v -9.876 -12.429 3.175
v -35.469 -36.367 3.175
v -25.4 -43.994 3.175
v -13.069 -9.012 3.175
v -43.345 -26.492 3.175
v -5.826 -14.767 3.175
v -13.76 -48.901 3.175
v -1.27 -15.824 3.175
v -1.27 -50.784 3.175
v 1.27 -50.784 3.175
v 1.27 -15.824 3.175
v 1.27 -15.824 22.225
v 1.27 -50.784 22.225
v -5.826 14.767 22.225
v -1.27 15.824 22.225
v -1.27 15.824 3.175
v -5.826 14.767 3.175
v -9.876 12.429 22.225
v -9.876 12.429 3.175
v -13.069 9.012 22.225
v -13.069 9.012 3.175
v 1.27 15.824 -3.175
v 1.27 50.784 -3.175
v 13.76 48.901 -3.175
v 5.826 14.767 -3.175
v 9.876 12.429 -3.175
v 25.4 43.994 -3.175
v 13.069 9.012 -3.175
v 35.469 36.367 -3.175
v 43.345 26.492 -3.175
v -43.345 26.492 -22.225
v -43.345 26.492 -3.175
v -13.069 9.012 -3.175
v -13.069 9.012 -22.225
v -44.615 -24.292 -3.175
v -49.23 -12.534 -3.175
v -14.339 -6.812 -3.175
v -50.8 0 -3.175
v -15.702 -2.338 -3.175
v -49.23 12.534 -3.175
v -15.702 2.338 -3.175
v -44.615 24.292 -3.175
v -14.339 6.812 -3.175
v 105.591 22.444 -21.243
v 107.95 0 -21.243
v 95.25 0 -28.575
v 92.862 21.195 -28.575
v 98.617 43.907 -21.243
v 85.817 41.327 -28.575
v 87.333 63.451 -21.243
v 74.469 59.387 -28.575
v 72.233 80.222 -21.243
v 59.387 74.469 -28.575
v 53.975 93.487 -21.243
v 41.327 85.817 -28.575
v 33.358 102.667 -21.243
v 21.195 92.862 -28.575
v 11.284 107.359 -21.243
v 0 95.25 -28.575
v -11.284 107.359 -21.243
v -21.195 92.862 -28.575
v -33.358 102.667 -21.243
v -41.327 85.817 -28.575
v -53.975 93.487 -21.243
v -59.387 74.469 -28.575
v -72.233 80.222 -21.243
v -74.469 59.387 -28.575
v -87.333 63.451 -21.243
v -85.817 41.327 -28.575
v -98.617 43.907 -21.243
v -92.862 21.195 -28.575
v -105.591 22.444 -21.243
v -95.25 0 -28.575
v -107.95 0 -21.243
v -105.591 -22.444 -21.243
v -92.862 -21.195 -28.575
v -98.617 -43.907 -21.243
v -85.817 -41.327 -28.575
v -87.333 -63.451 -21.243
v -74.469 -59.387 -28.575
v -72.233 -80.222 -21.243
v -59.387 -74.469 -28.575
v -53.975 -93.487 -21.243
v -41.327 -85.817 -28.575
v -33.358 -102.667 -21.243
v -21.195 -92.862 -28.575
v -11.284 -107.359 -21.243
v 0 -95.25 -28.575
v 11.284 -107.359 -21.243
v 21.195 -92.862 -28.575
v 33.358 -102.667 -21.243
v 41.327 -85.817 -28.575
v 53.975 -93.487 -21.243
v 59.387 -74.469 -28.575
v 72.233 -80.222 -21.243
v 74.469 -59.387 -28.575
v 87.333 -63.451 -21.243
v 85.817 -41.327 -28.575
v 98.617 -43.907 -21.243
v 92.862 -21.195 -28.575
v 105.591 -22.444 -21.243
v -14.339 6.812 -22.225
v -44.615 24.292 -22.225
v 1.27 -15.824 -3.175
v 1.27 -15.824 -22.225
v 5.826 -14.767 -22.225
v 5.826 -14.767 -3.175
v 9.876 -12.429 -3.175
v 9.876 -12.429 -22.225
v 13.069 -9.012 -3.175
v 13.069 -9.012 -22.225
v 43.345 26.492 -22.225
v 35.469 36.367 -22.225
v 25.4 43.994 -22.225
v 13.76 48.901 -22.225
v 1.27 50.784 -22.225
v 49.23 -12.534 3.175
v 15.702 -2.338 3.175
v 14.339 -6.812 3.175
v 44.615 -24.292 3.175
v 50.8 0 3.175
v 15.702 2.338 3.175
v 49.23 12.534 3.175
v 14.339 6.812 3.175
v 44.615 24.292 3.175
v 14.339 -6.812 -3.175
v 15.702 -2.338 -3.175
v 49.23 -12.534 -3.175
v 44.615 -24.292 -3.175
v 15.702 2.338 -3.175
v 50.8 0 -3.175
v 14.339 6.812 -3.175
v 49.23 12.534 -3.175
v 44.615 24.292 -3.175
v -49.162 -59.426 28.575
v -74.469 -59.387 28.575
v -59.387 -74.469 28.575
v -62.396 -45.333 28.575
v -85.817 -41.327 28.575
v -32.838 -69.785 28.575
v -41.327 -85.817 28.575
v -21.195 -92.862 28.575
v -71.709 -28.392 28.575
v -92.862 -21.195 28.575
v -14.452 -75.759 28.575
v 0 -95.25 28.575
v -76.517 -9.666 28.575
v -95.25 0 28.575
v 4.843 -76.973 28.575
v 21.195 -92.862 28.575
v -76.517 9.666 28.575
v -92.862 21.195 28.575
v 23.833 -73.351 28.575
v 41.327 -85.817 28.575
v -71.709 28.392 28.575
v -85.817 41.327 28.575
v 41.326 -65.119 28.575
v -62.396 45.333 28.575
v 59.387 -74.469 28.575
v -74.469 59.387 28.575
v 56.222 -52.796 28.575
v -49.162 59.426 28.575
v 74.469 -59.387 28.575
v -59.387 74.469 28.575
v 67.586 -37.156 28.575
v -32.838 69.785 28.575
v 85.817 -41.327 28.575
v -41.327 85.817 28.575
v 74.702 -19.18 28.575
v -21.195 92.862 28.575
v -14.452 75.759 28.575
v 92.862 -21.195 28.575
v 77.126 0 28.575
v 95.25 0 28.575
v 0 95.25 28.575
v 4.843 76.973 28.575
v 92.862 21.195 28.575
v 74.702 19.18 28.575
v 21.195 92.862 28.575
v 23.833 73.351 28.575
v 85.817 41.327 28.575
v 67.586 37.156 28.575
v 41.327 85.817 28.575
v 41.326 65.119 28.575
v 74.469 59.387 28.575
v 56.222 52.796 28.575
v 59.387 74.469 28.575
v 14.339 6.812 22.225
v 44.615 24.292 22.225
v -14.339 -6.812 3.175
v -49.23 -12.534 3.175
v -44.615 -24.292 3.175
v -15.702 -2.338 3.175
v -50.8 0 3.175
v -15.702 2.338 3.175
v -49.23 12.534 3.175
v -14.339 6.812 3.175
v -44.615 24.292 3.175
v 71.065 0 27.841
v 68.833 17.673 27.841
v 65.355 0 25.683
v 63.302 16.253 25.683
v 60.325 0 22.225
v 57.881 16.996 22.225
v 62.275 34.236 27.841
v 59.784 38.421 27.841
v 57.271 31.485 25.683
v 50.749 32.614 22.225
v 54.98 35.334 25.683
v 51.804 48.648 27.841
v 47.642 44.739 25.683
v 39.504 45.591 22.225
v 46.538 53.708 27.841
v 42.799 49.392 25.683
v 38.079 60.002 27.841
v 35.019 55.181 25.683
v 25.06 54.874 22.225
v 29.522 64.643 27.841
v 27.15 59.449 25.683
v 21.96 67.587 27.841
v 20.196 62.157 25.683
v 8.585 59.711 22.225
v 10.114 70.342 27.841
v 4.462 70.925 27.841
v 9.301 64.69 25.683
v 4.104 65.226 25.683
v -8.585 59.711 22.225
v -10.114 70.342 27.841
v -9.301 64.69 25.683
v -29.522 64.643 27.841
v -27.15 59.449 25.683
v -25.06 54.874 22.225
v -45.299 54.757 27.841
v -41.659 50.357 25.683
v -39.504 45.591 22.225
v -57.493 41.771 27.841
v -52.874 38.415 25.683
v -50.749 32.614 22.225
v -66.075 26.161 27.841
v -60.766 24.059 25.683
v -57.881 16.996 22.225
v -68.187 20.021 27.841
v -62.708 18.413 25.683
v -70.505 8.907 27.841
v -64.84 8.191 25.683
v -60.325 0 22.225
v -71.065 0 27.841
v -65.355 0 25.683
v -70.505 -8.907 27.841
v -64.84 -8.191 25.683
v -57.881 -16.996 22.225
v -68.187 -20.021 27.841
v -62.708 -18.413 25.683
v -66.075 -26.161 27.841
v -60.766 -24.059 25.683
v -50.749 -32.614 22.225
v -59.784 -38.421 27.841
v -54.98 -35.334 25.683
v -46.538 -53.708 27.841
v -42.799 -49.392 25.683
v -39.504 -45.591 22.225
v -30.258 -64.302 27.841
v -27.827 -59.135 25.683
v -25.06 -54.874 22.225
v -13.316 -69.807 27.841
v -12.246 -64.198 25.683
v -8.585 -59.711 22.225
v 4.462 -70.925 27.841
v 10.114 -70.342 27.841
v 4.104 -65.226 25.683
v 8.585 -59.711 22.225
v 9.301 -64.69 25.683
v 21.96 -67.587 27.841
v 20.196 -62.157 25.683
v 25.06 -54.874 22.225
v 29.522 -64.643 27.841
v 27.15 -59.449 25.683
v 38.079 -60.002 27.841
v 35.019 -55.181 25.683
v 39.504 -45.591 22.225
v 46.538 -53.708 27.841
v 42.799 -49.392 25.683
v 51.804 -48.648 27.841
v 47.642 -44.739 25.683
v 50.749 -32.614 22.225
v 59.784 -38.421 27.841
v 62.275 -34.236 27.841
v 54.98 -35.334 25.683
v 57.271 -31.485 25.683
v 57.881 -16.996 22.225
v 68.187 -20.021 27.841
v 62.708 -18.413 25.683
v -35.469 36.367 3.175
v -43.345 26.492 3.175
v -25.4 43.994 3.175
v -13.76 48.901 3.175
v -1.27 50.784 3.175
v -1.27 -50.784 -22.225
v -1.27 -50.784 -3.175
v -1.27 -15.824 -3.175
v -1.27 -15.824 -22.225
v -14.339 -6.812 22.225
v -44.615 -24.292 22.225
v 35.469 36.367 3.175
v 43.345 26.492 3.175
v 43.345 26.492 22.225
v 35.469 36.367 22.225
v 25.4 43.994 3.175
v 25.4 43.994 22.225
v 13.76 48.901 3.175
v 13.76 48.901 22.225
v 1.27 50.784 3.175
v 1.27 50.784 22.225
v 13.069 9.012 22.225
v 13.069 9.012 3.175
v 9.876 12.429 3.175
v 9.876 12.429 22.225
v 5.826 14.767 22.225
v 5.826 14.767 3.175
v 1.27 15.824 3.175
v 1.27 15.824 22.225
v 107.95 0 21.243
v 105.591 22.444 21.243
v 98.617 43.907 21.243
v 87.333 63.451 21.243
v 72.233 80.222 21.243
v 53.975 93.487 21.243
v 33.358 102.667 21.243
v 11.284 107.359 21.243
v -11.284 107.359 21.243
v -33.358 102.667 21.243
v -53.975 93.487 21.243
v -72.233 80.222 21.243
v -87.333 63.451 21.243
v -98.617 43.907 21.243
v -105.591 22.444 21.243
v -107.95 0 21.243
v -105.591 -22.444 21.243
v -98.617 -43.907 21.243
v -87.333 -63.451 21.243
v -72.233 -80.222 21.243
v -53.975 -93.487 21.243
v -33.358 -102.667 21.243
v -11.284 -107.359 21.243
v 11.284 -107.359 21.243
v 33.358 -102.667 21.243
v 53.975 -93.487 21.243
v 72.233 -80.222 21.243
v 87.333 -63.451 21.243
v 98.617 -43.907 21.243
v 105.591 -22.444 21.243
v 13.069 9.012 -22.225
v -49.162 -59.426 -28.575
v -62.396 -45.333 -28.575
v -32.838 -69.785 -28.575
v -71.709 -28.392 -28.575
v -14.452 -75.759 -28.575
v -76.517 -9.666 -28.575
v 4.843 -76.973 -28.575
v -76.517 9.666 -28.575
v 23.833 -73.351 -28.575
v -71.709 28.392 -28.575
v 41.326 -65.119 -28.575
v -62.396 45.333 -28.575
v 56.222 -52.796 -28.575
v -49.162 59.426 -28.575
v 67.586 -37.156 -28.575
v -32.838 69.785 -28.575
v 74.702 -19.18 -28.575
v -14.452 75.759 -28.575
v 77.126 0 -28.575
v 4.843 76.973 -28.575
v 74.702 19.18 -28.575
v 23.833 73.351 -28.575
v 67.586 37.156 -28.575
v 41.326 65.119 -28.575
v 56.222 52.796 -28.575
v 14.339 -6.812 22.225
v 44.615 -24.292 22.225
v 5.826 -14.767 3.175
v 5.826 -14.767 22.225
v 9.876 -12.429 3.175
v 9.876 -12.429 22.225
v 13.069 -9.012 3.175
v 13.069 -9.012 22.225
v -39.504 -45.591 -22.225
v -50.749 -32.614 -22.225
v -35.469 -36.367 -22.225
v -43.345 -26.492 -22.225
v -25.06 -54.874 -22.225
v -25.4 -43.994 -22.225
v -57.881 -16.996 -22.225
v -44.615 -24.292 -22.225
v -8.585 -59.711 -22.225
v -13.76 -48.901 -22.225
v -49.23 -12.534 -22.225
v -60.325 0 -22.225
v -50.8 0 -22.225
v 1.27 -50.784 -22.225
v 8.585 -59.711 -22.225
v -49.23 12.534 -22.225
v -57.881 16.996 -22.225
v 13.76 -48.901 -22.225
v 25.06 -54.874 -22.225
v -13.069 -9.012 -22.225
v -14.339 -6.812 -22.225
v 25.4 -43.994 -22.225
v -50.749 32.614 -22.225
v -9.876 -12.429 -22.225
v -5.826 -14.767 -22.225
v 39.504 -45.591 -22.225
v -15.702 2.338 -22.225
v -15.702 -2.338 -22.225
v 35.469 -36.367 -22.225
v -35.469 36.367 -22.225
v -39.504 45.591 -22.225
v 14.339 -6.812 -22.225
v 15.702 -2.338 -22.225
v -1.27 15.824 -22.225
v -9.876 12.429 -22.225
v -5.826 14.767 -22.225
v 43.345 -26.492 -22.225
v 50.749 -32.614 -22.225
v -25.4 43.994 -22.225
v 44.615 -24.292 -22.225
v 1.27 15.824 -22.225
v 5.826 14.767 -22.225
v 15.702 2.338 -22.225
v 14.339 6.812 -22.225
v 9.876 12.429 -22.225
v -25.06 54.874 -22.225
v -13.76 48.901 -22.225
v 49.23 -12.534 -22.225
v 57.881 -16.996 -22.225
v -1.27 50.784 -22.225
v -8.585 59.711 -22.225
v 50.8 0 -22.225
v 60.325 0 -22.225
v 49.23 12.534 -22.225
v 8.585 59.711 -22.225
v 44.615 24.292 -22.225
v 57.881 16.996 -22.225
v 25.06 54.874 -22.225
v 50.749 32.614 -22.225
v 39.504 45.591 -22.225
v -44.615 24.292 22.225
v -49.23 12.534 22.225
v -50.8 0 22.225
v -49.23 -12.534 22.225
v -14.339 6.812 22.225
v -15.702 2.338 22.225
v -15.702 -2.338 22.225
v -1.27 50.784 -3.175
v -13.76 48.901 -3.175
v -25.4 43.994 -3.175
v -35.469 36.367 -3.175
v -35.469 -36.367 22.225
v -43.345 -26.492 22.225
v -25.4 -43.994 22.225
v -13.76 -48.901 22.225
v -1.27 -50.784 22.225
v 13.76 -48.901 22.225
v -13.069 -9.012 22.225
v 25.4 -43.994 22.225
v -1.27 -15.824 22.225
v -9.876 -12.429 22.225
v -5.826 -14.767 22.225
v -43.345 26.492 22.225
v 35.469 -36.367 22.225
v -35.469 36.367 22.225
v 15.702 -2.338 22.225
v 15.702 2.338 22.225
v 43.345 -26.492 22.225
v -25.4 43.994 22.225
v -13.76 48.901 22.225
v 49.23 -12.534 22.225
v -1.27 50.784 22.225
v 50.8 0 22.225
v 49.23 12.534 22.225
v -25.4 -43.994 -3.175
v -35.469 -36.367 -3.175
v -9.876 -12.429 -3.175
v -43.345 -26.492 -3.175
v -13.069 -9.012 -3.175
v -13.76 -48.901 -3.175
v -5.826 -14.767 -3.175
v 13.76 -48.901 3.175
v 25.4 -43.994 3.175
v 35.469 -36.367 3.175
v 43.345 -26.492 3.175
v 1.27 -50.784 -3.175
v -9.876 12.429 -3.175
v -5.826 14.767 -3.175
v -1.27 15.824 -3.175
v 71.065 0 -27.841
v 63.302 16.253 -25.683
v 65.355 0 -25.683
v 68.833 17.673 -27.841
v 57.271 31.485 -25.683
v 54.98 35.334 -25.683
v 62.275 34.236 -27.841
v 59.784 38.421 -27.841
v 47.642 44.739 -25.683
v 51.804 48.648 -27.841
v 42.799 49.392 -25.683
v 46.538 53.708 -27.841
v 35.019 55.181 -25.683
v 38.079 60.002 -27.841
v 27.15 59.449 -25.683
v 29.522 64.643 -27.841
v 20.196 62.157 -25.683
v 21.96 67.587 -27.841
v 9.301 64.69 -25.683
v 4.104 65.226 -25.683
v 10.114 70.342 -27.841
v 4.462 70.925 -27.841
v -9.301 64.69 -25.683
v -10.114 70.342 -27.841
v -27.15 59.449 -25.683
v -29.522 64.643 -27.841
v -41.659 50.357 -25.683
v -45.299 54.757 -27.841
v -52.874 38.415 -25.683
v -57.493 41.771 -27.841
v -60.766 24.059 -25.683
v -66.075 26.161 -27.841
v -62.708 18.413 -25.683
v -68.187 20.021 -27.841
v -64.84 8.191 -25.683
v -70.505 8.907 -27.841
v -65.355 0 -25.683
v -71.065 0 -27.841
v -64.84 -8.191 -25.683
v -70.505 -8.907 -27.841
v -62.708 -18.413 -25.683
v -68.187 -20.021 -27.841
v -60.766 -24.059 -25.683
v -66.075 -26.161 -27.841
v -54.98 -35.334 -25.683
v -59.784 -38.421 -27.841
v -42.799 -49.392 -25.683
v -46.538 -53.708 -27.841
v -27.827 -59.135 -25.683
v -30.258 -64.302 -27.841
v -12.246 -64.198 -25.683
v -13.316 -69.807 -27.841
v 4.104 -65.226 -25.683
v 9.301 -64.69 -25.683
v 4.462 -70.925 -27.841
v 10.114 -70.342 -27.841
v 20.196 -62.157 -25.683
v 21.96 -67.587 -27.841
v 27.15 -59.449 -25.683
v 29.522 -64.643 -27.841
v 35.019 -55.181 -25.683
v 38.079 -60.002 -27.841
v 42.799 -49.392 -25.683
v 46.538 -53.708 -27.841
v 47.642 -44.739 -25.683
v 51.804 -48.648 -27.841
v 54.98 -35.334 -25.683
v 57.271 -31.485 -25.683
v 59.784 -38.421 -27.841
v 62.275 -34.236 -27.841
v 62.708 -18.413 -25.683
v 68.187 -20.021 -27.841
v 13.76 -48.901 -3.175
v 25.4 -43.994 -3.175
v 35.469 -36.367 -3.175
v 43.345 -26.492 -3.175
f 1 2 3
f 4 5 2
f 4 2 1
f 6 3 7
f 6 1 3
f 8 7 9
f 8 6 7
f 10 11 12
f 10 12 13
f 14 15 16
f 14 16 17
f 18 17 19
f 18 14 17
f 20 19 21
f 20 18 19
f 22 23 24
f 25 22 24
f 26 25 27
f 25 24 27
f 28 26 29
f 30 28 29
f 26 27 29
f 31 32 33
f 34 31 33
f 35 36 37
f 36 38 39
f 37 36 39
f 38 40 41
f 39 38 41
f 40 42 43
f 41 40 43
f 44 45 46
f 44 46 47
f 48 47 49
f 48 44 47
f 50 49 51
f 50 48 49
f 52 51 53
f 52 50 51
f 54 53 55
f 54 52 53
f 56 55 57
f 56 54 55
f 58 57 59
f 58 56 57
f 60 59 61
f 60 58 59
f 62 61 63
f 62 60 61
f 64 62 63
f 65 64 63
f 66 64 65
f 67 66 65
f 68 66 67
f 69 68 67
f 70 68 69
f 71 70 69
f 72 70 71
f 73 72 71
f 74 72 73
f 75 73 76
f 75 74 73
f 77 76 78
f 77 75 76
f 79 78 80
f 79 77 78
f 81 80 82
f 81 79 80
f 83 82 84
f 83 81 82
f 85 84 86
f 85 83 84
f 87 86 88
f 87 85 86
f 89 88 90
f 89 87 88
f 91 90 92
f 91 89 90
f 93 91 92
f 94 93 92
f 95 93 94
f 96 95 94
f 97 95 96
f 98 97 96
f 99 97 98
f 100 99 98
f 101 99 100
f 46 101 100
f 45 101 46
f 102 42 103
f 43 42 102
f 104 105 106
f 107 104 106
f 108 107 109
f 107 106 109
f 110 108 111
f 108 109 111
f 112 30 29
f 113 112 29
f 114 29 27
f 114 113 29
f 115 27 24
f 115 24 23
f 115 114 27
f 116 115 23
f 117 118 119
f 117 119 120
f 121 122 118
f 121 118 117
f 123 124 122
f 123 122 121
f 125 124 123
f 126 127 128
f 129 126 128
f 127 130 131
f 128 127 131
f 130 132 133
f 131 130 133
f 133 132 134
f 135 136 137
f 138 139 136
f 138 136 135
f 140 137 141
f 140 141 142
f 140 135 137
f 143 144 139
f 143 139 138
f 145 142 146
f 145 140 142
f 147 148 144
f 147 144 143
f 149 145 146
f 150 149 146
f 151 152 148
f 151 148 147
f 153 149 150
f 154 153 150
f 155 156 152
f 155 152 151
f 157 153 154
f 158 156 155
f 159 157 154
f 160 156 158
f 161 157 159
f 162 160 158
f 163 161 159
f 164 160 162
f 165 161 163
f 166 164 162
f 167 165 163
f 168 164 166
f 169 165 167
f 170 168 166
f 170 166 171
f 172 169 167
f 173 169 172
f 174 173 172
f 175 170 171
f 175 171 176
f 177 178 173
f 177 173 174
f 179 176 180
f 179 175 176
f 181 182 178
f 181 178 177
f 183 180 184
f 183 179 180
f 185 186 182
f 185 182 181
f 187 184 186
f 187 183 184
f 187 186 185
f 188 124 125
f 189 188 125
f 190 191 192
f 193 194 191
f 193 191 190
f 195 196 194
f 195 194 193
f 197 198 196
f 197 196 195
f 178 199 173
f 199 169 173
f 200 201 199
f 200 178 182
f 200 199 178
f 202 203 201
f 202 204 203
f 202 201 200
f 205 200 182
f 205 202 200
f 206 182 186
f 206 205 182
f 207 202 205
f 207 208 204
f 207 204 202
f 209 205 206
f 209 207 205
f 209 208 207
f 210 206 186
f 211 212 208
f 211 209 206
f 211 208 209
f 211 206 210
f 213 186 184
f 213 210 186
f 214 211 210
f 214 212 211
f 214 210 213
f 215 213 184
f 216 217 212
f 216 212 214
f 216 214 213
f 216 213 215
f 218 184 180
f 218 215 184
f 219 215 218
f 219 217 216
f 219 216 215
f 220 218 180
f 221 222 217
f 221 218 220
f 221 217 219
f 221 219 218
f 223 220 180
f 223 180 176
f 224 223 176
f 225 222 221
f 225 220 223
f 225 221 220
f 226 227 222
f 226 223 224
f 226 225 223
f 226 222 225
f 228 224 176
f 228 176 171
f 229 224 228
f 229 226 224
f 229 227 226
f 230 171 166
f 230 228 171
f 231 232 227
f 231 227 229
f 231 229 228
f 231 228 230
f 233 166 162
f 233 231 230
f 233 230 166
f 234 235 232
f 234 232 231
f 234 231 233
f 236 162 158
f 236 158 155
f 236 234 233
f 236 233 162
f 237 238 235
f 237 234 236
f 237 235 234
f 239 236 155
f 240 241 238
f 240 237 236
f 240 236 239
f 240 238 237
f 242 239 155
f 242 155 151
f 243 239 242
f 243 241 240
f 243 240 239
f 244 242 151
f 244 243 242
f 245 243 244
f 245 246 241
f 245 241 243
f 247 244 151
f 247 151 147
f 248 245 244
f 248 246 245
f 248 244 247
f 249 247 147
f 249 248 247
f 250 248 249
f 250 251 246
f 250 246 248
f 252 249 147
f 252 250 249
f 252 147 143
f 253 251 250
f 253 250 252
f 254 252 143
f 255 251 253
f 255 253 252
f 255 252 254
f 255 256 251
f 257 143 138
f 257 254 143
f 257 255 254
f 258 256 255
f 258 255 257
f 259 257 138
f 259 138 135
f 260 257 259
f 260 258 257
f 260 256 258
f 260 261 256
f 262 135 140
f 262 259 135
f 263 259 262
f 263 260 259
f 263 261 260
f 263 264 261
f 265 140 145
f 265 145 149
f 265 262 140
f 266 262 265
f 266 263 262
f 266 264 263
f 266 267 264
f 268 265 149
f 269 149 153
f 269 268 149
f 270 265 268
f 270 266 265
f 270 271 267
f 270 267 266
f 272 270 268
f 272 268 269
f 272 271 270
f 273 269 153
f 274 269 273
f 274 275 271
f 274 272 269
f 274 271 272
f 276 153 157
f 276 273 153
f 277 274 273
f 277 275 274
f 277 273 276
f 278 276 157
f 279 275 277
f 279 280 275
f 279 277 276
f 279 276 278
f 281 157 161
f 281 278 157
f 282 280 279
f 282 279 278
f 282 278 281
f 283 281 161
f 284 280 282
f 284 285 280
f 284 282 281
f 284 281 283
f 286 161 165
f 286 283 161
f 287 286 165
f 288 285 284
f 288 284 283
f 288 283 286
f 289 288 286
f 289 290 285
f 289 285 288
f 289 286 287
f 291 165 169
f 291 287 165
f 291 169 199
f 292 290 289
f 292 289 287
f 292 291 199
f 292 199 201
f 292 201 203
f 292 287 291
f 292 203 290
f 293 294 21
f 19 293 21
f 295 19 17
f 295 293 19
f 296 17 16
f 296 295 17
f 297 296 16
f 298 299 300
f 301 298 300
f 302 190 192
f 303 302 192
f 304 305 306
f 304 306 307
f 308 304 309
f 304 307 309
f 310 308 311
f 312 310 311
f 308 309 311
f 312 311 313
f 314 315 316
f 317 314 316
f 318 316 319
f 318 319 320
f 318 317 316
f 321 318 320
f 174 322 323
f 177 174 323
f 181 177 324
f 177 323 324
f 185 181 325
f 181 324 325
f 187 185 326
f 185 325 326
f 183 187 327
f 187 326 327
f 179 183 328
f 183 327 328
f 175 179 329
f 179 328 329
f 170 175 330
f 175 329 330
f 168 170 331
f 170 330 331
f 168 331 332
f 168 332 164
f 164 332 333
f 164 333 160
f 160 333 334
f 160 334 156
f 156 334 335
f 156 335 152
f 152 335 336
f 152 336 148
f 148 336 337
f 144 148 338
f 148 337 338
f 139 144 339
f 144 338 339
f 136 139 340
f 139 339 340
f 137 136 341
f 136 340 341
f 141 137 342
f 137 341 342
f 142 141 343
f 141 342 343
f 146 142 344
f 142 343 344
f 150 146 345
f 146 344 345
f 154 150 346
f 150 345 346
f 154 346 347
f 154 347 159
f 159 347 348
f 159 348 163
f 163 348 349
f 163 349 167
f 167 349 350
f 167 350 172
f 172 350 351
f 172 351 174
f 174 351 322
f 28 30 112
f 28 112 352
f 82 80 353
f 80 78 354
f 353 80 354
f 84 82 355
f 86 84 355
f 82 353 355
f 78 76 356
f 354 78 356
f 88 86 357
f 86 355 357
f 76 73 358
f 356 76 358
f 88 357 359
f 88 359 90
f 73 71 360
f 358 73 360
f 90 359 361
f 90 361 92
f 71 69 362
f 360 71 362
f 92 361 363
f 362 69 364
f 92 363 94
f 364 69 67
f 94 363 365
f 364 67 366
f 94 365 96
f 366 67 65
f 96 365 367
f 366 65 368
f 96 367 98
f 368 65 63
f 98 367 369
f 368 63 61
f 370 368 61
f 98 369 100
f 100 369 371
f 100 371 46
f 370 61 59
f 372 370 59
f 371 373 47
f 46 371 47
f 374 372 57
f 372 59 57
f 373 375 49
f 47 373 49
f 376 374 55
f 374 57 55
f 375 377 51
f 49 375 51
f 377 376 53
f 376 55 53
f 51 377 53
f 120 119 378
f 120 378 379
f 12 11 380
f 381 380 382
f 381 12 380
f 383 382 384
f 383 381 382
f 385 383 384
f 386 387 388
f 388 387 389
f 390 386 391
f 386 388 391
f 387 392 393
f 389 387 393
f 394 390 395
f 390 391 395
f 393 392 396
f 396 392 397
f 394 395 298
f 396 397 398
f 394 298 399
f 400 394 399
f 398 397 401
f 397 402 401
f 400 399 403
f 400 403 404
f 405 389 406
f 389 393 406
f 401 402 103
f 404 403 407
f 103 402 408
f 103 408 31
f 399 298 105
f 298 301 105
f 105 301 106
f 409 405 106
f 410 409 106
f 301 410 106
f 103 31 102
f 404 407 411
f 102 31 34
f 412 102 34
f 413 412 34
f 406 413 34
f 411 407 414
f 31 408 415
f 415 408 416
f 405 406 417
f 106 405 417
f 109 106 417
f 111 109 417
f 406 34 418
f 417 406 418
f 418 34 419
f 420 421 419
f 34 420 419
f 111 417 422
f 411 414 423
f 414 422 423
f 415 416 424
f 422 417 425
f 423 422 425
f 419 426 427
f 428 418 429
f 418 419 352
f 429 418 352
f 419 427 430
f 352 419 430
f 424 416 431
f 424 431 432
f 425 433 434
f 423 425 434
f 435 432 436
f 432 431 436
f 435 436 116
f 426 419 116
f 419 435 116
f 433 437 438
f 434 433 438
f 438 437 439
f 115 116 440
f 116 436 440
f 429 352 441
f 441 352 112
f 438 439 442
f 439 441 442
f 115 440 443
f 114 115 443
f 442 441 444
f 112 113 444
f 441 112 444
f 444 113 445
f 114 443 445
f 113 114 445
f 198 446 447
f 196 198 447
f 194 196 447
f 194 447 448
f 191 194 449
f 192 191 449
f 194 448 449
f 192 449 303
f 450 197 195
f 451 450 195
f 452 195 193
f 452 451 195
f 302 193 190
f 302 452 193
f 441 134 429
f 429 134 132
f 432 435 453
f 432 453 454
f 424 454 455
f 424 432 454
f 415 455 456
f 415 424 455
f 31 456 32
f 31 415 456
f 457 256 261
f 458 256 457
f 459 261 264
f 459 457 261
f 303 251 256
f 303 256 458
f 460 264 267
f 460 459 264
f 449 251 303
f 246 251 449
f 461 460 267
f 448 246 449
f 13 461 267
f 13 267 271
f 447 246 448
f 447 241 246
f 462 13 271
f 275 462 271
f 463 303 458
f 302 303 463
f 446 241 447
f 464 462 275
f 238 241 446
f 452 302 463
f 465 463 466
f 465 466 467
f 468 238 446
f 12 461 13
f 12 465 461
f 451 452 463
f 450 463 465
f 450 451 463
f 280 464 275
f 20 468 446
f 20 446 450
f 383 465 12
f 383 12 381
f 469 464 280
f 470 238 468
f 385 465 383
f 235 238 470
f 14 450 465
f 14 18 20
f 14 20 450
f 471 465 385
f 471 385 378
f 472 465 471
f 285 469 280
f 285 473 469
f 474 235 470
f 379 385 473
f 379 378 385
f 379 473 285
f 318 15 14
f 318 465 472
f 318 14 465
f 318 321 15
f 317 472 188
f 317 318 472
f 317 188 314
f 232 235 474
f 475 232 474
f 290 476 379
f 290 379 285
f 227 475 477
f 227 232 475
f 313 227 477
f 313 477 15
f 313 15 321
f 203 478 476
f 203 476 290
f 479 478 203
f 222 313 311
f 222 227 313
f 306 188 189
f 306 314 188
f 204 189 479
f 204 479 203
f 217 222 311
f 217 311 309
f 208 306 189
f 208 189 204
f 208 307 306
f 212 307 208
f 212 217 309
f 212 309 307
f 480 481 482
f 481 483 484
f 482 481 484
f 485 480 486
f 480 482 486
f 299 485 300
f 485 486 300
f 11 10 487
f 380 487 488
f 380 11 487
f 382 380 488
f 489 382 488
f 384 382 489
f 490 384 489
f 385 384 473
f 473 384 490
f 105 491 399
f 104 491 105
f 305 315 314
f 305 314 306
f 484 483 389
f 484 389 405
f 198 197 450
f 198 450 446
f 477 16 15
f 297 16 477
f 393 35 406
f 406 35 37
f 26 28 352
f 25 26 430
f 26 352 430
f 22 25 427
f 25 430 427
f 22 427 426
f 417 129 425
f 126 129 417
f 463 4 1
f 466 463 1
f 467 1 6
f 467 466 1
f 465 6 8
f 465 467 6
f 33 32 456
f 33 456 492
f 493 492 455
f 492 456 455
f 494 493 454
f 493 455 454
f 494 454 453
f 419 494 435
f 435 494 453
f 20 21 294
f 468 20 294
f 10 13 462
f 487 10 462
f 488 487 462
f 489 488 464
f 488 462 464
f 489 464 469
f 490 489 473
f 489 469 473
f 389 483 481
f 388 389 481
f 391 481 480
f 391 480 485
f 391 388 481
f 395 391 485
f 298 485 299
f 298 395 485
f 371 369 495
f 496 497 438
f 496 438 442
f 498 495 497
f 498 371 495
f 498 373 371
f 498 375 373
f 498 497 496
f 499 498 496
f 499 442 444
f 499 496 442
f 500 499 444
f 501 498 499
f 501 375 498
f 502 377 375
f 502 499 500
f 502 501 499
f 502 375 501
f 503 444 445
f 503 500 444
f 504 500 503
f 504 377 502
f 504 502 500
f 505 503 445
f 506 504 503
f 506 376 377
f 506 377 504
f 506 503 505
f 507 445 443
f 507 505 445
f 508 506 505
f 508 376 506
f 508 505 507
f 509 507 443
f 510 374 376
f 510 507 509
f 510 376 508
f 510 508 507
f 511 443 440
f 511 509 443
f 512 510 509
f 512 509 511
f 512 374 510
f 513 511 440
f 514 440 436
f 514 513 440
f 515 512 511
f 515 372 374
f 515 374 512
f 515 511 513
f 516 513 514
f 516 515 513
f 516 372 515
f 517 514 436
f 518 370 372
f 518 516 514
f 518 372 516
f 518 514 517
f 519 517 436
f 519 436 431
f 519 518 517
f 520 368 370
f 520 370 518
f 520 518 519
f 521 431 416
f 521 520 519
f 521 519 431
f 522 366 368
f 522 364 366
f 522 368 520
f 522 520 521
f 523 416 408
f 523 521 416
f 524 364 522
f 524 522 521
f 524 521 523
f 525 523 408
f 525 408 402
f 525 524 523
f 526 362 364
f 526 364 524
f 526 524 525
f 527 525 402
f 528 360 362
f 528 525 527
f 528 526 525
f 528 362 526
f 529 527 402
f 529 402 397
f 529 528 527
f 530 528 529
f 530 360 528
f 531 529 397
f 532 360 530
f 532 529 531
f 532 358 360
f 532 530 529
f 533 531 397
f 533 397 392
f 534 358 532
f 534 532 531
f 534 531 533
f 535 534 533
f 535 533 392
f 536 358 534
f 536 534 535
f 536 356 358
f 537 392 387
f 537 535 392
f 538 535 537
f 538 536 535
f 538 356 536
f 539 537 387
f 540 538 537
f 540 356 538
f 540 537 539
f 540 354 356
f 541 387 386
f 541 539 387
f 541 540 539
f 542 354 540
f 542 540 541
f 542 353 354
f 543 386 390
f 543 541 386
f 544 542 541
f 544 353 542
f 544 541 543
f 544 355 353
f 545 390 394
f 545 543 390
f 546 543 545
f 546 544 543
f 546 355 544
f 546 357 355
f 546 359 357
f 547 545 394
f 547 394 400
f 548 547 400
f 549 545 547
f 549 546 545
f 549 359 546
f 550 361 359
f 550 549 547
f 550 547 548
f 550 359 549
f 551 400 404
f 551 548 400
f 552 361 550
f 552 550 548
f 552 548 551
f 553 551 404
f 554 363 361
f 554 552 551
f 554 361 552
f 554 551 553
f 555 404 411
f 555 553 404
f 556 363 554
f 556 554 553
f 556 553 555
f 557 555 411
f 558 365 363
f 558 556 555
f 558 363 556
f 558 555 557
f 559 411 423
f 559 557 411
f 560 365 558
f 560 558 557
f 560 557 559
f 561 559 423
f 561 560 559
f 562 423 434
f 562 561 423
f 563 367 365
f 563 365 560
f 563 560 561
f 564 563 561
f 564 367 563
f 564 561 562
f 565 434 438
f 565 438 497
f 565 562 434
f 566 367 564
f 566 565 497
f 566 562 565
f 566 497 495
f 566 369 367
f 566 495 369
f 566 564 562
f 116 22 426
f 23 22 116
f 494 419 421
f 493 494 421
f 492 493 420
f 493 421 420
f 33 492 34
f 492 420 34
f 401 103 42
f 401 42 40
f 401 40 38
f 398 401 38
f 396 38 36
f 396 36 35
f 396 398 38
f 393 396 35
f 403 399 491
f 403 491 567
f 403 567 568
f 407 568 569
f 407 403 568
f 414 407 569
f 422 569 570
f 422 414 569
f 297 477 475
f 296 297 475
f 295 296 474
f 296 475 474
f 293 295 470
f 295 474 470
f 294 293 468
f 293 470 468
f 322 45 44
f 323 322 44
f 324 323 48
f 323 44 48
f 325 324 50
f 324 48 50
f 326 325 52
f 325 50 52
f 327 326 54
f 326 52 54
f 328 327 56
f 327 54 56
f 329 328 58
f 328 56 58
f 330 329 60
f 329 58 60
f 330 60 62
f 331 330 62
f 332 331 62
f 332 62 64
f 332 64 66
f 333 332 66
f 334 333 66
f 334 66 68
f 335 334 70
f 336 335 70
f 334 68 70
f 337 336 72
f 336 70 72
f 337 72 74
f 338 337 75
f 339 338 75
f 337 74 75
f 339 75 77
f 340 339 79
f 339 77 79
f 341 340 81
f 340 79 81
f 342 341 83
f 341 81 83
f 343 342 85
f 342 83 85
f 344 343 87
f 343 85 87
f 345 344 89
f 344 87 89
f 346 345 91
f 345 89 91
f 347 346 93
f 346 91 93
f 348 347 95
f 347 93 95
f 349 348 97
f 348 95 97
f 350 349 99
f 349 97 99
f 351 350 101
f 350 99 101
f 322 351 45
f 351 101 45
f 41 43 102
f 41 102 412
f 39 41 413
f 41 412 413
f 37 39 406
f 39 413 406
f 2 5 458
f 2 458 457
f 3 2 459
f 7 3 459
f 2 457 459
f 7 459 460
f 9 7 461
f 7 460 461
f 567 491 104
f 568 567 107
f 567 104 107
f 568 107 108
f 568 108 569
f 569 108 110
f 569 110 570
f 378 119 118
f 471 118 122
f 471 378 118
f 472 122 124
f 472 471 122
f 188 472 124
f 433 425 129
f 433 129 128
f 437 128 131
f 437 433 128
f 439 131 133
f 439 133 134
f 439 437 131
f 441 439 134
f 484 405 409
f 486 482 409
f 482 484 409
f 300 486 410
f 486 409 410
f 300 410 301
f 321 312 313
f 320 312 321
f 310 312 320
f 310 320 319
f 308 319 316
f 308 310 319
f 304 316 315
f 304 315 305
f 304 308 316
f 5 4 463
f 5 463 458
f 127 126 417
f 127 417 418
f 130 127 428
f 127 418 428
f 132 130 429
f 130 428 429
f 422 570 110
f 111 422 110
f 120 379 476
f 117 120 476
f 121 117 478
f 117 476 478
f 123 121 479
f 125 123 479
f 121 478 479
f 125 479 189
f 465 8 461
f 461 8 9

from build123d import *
from OCP.BRepFilletAPI import BRepFilletAPI_MakeChamfer

# Parameters (mm, degrees)
EXTRUDE1_DEPTH          = 28.575
EXTRUDE1_DEPTH_BACK     = 28.575
SKETCH1_R               = 107.95
CHAMFER1_SIZE           = 12.7
CHAMFER1_SIZE2          = 7.332348419
SKETCH2_R               = 60.325
EXTRUDE2_DEPTH          = 6.35
FILLET1_R               = 25.4
SKETCH5_R               = 50.8
EXTRUDE4_DEPTH          = 19.05
SKETCH6_W               = 2.54
SKETCH6_H               = 50.8
EXTRUDE_THIN1_DEPTH     = 19.05
CIRPATTERN2_COUNT       = 6
SKETCH7_R               = 15.875
EXTRUDE5_DEPTH          = 19.05
MIRROR4_COPY_1_SKETCH_W = 2.54
MIRROR4_COPY_1_SKETCH_H = 50.8
MIRROR4_COPY_1_DEPTH    = 19.05
MIRROR4_COPY_2_SKETCH_W = 2.54
MIRROR4_COPY_2_SKETCH_H = 50.8
MIRROR4_COPY_2_DEPTH    = 19.05
MIRROR4_COPY_3_SKETCH_W = 2.54
MIRROR4_COPY_3_SKETCH_H = 50.8
MIRROR4_COPY_3_DEPTH    = 19.05
MIRROR4_COPY_4_SKETCH_W = 2.54
MIRROR4_COPY_4_SKETCH_H = 50.8
MIRROR4_COPY_4_DEPTH    = 19.05
MIRROR4_COPY_5_SKETCH_W = 2.54
MIRROR4_COPY_5_SKETCH_H = 50.8
MIRROR4_COPY_5_DEPTH    = 19.05
FILLET2_R               = 25.4


with BuildPart() as part:
    # Sketch1 → Extrude1 (new, two sides: drawn at the far end of the back side and taken through both)
    with BuildSketch(Plane.XY.offset(-EXTRUDE1_DEPTH_BACK)):
        Circle(SKETCH1_R)
    extrude(amount=EXTRUDE1_DEPTH + EXTRUDE1_DEPTH_BACK)

    # Chamfer1: one chamfer whose edges measure the first distance from different faces: ONE call of the kernel's chamfer builder (chamfer() names one face for all edges)
    chamfer1_edges_1 = [part.edges().sort_by_distance(p)[0] for p in [
        (-107.95, 0, -28.575),
    ]]
    chamfer1_side_1 = [part.faces().sort_by_distance(p)[0] for p in [
        (0, 0, -28.575),
    ]]
    chamfer1_edges_2 = [part.edges().sort_by_distance(p)[0] for p in [
        (-107.95, 0, 28.575),
    ]]
    chamfer1_side_2 = [part.faces().sort_by_distance(p)[0] for p in [
        (0, 0, 28.575),
    ]]
    chamfer1 = BRepFilletAPI_MakeChamfer(part.part.solid().wrapped)
    for e in chamfer1_edges_1:
        chamfer1.Add(CHAMFER1_SIZE, CHAMFER1_SIZE2, e.wrapped, chamfer1_side_1[0].wrapped)  # the first distance lies on this face
    for e in chamfer1_edges_2:
        chamfer1.Add(CHAMFER1_SIZE, CHAMFER1_SIZE2, e.wrapped, chamfer1_side_2[0].wrapped)  # the first distance lies on this face
    add(Compound.cast(chamfer1.Shape()), mode=Mode.REPLACE)

    # Sketch2 → Extrude2 (cut)
    with BuildSketch(Plane.XY.offset(28.575)):
        Circle(SKETCH2_R)
    extrude2 = extrude(amount=-EXTRUDE2_DEPTH, mode=Mode.SUBTRACT)

    # Fillet1
    # the kernel refuses this fillet: 25.4 mm, written as the material it takes off along each edge
    with BuildSketch(Plane(origin=(0, 0, 28.575), x_dir=(1, 0, 0), z_dir=(0, -1, 0))) as fillet1_piece_1:
        with BuildLine():
            CenterArc((77.125520825, -25.4), FILLET1_R, 90, 41.409622109)
            Line((60.325, -6.35), (59.988989583, -5.969))
            ThreePointArc((59.988989583, -5.969), (59.817, -3.175), (59.817, 0))
            Line((59.817, 0), (60.325, 0.508))
            Line((60.325, 0.508), (77.125520825, 0.508))
            Line((77.125520825, 0.508), (77.125520825, 0))
        make_face()
    revolve(axis=Axis((0, 0, 28.575), (0, 0, 1)), mode=Mode.SUBTRACT)

    # Sketch5 → Extrude4 (cut)
    with BuildSketch(Plane.XY.offset(22.225)):
        Circle(SKETCH5_R)
    extrude4 = extrude(amount=-EXTRUDE4_DEPTH, mode=Mode.SUBTRACT)

    # Sketch6 → Extrude-Thin1 (add)
    with BuildSketch(Plane.XY.offset(3.175)):
        with Locations((0, 25.4)):
            Rectangle(SKETCH6_W, SKETCH6_H)
    extrude_thin1 = extrude(amount=EXTRUDE_THIN1_DEPTH)

    # CirPattern2: Extrude-Thin1 ×6 about axis
    cirpattern2_axis = Axis((0, 0, 0), (0, 0, 1))
    for i in range(1, CIRPATTERN2_COUNT):
        add(extrude_thin1.rotate(cirpattern2_axis, i * 360 / CIRPATTERN2_COUNT))

    # Sketch7 → Extrude5 (add)
    with BuildSketch(Plane.XY.offset(22.225)):
        Circle(SKETCH7_R)
    extrude5 = extrude(amount=-EXTRUDE5_DEPTH)

    # Mirror4: Extrude2, Extrude4, Extrude-Thin1, Extrude5 across plane
    add(extrude2.mirror(Plane.XY), mode=Mode.SUBTRACT)
    add(extrude4.mirror(Plane.XY), mode=Mode.SUBTRACT)
    add(extrude_thin1.mirror(Plane.XY))
    add(extrude5.mirror(Plane.XY))

    # Mirror4 copy 1 sketch → Mirror4 copy 1 (add)
    with BuildSketch(Plane(origin=(0, 0, -3.175), x_dir=(0.5000000000000001, 0.8660254037844386, 0), z_dir=(0, 0, -1))):
        with Locations((0, -25.4)):
            Rectangle(MIRROR4_COPY_1_SKETCH_W, MIRROR4_COPY_1_SKETCH_H)
    extrude(amount=MIRROR4_COPY_1_DEPTH)

    # Mirror4 copy 2 sketch → Mirror4 copy 2 (add)
    with BuildSketch(Plane(origin=(0, 0, -3.175), x_dir=(-0.4999999999999998, 0.8660254037844387, 0), z_dir=(0, 0, -1))):
        with Locations((0, -25.4)):
            Rectangle(MIRROR4_COPY_2_SKETCH_W, MIRROR4_COPY_2_SKETCH_H)
    extrude(amount=MIRROR4_COPY_2_DEPTH)

    # Mirror4 copy 3 sketch → Mirror4 copy 3 (add)
    with BuildSketch(Plane(origin=(0, 0, -3.175), x_dir=(-1, 0, 0), z_dir=(0, 0, -1))):
        with Locations((0, -25.4)):
            Rectangle(MIRROR4_COPY_3_SKETCH_W, MIRROR4_COPY_3_SKETCH_H)
    extrude(amount=MIRROR4_COPY_3_DEPTH)

    # Mirror4 copy 4 sketch → Mirror4 copy 4 (add)
    with BuildSketch(Plane(origin=(0, 0, -3.175), x_dir=(-0.5000000000000004, -0.8660254037844384, 0), z_dir=(0, 0, -1))):
        with Locations((0, -25.4)):
            Rectangle(MIRROR4_COPY_4_SKETCH_W, MIRROR4_COPY_4_SKETCH_H)
    extrude(amount=MIRROR4_COPY_4_DEPTH)

    # Mirror4 copy 5 sketch → Mirror4 copy 5 (add)
    with BuildSketch(Plane(origin=(0, 0, -3.175), x_dir=(0.5000000000000001, -0.8660254037844386, 0), z_dir=(0, 0, -1))):
        with Locations((0, -25.4)):
            Rectangle(MIRROR4_COPY_5_SKETCH_W, MIRROR4_COPY_5_SKETCH_H)
    extrude(amount=MIRROR4_COPY_5_DEPTH)

    # Fillet2
    # the kernel refuses this fillet: 25.4 mm, written as the material it takes off along each edge
    with BuildSketch(Plane(origin=(0, 0, -28.575), x_dir=(1, 0, 0), z_dir=(0, -1, 0))) as fillet2_piece_1:
        with BuildLine():
            CenterArc((77.125520825, 25.4), FILLET2_R, 228.590377891, 41.409622109)
            Line((60.325, 6.35), (59.988989583, 5.969))
            ThreePointArc((59.988989583, 5.969), (59.817, 3.175), (59.817, 0))
            Line((59.817, 0), (60.325, -0.508))
            Line((60.325, -0.508), (77.125520825, -0.508))
            Line((77.125520825, -0.508), (77.125520825, 0))
        make_face()
    revolve(axis=Axis((0, 0, -28.575), (0, 0, 1)), mode=Mode.SUBTRACT)


solid = part.part
